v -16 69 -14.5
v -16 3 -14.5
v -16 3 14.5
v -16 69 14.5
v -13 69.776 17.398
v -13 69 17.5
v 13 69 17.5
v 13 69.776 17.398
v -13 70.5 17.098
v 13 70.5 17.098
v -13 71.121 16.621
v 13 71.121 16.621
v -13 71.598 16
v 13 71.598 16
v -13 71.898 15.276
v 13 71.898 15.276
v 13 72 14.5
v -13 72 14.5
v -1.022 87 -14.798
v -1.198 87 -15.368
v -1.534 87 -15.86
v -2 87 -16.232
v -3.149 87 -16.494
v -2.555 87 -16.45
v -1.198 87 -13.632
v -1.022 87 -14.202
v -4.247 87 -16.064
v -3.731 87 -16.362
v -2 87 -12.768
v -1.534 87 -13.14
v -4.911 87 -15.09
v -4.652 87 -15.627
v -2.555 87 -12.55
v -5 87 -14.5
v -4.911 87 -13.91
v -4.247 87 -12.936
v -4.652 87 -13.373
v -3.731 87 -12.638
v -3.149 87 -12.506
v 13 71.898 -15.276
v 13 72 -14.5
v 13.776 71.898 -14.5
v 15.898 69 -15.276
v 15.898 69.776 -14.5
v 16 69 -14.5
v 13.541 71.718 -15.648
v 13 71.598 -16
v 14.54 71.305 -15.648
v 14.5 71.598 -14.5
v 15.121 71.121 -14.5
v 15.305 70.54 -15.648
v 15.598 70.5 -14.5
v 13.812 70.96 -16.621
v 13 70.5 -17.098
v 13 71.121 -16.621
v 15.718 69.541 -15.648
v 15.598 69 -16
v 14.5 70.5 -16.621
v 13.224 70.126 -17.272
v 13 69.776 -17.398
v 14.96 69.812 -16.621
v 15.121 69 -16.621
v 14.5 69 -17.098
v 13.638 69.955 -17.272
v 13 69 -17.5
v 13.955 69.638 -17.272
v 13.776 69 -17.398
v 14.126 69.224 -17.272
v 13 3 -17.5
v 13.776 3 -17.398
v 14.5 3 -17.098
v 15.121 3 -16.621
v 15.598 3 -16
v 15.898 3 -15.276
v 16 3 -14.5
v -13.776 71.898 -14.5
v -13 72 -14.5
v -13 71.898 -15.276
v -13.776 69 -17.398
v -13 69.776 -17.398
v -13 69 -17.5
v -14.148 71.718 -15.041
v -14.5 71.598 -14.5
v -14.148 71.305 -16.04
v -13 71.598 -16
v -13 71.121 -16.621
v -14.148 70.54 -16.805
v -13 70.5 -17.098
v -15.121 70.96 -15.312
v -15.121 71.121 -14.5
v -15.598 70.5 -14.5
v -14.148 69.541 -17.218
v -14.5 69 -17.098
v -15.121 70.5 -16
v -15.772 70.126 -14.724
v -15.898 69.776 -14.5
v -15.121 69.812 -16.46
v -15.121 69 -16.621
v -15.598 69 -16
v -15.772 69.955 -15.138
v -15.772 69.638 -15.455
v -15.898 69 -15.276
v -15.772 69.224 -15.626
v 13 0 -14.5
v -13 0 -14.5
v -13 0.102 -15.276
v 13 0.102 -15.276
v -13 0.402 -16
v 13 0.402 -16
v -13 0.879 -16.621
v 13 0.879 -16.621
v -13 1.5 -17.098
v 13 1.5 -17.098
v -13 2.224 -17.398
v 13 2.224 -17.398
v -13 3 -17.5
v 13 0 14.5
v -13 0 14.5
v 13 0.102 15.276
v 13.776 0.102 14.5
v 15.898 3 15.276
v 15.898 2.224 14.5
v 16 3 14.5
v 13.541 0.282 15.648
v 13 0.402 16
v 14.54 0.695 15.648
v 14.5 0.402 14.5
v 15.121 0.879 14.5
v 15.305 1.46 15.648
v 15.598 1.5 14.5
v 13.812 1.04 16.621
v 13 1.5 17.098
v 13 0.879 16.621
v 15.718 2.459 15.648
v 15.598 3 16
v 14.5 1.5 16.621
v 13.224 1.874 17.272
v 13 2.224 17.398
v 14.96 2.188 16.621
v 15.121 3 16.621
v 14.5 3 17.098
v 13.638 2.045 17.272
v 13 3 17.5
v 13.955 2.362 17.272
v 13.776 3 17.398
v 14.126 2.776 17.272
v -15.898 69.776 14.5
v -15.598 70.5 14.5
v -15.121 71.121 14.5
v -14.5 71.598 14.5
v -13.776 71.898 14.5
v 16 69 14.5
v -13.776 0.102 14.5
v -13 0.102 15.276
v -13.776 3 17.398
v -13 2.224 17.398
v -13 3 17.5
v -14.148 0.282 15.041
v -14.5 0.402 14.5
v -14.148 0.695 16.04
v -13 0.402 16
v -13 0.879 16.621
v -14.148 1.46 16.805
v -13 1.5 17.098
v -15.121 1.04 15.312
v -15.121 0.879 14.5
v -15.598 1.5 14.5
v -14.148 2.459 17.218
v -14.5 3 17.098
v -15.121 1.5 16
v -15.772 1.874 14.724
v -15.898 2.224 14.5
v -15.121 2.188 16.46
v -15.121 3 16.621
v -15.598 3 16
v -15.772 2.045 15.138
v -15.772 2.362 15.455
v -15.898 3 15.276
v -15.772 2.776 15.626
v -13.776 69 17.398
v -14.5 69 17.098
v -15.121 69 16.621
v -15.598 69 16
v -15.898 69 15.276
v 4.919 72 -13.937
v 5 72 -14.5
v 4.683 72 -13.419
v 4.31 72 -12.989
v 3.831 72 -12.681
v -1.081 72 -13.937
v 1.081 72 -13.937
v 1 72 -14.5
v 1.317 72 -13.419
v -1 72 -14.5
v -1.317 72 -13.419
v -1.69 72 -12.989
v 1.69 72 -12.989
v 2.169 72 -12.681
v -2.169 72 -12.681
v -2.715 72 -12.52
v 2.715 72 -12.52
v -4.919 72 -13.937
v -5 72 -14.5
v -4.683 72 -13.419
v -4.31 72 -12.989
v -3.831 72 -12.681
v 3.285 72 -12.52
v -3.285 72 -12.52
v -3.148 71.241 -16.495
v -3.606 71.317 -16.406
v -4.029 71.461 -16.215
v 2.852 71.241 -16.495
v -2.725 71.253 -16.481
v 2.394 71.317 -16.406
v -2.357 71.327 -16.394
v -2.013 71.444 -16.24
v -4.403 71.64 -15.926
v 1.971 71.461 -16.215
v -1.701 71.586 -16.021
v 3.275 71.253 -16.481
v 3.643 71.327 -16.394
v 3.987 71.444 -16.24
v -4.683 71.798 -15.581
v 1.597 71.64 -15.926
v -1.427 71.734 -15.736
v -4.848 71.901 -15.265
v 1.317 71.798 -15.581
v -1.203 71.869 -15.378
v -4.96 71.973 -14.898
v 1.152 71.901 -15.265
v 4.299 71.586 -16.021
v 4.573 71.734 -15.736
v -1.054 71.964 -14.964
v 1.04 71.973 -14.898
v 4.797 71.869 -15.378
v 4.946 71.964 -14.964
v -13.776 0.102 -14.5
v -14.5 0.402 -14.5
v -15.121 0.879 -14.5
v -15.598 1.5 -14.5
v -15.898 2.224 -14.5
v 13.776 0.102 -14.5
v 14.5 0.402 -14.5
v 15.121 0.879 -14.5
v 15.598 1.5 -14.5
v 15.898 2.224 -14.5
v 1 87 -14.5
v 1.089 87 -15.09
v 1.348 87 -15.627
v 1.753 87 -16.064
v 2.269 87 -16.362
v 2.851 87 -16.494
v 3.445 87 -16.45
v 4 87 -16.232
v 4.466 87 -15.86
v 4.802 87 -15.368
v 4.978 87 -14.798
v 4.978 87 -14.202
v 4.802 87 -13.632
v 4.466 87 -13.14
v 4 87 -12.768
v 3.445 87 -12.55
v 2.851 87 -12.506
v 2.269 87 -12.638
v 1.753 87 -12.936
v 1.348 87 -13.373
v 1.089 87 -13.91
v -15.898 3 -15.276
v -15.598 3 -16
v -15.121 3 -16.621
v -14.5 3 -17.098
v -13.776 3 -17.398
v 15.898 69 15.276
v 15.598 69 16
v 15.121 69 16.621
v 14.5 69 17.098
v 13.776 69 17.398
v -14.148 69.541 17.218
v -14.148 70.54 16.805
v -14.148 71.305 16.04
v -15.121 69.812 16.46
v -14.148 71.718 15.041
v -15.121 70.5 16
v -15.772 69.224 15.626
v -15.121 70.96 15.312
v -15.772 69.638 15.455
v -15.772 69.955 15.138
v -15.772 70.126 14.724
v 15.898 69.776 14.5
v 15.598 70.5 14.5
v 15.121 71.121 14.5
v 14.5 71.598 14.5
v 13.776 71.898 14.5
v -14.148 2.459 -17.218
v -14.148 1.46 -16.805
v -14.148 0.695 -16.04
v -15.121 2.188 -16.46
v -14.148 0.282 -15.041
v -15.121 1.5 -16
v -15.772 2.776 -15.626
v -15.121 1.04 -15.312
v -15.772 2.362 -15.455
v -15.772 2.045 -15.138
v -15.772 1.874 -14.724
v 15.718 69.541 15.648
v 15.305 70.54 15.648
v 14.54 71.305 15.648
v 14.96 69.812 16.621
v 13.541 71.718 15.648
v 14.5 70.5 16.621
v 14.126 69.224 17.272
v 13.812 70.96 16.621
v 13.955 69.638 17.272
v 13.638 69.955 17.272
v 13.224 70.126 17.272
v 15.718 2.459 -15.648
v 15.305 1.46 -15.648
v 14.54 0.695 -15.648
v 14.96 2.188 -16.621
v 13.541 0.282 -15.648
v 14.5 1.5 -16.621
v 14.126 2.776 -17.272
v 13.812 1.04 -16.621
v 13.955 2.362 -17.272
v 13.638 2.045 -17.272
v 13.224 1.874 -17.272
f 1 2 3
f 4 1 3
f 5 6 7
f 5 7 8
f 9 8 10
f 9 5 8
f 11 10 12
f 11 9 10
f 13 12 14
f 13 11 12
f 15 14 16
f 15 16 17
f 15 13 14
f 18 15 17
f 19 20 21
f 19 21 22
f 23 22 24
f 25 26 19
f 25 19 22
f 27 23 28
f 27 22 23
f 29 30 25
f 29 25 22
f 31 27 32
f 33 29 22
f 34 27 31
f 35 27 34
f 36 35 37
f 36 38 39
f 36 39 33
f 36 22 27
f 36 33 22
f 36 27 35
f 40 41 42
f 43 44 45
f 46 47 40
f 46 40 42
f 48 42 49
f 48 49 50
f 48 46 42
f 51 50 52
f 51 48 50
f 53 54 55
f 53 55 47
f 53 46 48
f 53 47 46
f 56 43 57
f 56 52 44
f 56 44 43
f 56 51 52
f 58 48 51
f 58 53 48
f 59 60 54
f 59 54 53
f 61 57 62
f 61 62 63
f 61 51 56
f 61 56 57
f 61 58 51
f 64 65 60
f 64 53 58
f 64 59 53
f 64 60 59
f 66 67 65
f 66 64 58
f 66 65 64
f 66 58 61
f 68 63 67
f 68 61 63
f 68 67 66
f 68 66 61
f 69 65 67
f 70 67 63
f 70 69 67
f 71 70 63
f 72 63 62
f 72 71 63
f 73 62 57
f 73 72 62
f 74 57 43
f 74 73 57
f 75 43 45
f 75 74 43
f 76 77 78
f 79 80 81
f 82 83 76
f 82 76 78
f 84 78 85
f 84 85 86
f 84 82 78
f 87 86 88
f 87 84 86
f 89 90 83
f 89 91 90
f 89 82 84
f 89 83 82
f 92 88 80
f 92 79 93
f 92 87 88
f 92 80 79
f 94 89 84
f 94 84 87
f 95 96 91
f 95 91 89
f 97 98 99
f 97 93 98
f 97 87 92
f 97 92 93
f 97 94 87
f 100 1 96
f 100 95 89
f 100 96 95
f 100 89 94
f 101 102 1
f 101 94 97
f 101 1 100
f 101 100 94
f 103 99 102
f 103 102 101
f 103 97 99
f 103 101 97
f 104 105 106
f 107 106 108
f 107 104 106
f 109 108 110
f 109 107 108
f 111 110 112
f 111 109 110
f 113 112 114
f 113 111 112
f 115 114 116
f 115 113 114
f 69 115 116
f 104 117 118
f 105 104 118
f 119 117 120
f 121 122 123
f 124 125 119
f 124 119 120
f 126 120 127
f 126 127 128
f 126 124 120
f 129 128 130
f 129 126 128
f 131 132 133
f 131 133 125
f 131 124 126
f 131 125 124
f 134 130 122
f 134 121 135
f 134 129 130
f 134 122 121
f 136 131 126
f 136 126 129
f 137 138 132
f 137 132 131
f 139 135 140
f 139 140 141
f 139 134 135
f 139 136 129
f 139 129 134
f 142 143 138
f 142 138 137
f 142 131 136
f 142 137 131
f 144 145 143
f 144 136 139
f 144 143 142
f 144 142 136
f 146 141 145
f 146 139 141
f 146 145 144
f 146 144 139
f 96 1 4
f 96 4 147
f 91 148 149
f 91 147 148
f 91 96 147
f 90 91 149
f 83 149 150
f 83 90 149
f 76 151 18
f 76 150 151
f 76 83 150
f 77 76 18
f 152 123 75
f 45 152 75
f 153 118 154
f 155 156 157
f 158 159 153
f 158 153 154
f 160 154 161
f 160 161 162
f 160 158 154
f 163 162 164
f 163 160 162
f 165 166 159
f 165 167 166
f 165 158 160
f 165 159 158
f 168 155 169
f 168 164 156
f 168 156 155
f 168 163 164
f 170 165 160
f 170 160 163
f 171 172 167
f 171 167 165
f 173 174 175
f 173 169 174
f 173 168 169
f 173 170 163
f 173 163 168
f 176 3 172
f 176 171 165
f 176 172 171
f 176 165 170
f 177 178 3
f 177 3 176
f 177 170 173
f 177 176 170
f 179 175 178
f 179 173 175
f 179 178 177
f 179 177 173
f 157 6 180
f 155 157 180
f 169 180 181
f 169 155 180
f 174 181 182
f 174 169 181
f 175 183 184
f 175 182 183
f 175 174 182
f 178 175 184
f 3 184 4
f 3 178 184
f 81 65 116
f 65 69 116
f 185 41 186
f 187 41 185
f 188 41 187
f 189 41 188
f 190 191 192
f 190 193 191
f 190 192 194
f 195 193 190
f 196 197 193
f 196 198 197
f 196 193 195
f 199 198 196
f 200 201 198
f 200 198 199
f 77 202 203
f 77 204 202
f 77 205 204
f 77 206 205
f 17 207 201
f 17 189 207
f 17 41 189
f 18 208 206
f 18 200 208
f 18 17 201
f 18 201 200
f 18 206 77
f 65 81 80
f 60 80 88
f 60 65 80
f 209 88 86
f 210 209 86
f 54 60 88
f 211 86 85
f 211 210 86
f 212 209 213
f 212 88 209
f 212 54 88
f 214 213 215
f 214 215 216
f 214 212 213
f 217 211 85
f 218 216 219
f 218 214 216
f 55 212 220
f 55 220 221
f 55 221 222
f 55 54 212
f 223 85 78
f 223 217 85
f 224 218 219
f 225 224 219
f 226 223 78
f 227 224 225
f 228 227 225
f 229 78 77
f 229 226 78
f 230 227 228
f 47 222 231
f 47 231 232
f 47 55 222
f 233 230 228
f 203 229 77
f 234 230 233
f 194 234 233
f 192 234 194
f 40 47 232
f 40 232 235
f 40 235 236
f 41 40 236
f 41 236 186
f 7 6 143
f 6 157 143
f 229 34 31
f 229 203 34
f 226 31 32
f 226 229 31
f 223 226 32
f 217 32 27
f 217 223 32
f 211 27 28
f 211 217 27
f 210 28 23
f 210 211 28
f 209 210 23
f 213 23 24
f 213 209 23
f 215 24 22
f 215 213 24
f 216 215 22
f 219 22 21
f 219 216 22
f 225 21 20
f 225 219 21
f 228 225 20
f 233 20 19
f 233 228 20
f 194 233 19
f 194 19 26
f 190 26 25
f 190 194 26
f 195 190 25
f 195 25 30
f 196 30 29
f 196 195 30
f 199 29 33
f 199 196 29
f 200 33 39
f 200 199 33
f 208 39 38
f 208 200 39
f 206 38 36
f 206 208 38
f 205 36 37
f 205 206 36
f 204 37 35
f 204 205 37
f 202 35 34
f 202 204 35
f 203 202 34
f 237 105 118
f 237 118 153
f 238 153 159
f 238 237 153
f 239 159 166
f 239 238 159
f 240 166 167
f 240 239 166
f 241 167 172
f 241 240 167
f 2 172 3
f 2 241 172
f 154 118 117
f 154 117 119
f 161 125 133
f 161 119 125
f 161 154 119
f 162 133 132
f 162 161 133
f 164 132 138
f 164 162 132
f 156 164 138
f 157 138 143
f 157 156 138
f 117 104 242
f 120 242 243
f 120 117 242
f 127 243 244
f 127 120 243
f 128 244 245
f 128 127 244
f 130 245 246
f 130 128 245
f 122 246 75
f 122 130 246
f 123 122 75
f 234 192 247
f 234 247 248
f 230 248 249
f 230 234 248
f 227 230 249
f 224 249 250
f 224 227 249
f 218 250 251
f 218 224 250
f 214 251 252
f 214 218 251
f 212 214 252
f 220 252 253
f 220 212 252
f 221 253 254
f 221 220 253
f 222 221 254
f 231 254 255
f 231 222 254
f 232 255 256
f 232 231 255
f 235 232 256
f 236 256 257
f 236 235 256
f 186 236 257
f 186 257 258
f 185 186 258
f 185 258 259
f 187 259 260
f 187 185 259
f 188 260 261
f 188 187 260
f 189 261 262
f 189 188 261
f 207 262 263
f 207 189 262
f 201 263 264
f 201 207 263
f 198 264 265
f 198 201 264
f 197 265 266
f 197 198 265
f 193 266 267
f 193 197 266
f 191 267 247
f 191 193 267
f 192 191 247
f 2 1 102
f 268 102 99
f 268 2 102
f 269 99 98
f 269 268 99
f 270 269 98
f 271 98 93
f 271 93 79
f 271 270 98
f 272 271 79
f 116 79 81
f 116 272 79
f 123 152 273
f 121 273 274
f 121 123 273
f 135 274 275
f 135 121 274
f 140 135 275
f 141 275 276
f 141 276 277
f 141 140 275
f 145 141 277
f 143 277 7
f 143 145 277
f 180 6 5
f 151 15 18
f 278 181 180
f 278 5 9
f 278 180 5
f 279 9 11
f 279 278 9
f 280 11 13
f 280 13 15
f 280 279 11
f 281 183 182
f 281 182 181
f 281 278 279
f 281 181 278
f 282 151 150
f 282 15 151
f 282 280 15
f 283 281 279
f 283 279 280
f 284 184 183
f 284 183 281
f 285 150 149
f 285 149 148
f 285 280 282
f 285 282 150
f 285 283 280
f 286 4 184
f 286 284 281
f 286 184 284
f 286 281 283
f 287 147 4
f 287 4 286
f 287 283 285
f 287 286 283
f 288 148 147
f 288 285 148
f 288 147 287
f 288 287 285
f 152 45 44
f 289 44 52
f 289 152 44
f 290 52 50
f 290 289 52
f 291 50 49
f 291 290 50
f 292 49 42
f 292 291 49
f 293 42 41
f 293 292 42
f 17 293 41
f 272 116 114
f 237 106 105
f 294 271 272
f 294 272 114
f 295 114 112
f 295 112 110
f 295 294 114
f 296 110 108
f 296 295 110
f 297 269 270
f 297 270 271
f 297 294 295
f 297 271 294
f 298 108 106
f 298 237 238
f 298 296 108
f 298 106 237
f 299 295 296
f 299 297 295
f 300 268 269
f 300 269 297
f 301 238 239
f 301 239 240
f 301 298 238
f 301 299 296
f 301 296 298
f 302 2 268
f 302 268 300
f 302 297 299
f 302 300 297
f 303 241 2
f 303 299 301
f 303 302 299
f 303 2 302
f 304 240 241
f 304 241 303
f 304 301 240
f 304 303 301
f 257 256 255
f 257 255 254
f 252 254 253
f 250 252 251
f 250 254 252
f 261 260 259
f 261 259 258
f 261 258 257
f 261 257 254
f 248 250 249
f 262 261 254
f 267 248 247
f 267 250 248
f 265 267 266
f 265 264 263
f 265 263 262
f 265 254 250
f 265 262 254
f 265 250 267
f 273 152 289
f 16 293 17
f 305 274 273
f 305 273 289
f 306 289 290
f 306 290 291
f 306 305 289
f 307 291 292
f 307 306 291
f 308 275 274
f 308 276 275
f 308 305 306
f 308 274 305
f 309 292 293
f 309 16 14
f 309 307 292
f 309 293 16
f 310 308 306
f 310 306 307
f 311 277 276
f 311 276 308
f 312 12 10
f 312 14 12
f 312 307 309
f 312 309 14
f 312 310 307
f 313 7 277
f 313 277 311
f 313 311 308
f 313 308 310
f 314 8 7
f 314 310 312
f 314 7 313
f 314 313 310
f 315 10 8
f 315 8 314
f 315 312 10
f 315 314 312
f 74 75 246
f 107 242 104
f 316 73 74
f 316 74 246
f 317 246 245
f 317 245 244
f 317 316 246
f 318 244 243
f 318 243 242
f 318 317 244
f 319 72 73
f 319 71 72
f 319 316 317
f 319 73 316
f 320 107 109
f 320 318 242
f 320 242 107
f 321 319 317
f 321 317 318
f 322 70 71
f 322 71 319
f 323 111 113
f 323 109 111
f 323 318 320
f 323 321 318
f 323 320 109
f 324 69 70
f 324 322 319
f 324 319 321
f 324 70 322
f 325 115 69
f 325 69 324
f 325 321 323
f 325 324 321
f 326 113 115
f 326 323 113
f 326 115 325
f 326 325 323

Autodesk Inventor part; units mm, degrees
ref_plane "YZ Plane" through (0, 0, 0) normal (1, 0, 0) x (0, 1, 0)
ref_plane "XZ Plane" through (0, 0, 0) normal (0, 1, 0) x (-1, 0, 0)
ref_plane "XY Plane" through (0, 0, 0) normal (0, 0, 1) x (1, 0, 0)
sketch "Sketch1" plane through (0, 0, 0) normal (0, 1, 0) x (-1, 0, 0)
  line L0 (16, 17.5) -> (-16, 17.5)
  line L1 (-16, 17.5) -> (-16, -17.5)
  line L2 (-16, -17.5) -> (16, -17.5)
  line L3 (16, -17.5) -> (16, 17.5)
  line L4 (16, 17.5) -> (-16, -17.5) construction
  line L5 (-16, 17.5) -> (16, -17.5) construction
  line L6 (0, -17.5) -> (0, -14.5) construction
  line L7 (0, -14.5) -> (3, -14.5) construction
  circle A0 centre (3, -14.5) radius 2
  circle A1 centre (-3, -14.5) radius 2
  point P0 (0, 0)
  dimension "d0" = 32
  dimension "d1" = 35
  dimension "d5" = 3
  dimension "d6" = 3
  dimension "d7" = 4
extrude "Extrusion1" add sketch "Sketch1" along normal blind 72 contours L3 L2 L1 L0 | A0 | A1
extrude "Extrusion2" add sketch "Sketch1" along normal blind 15 from surface at 72 contours A0 | A1
fillet "Fillet1" radius 3 12 edges at (16, 36, 17.5) (16, 36, -17.5) (-16, 36, 17.5) (-16, 36, -17.5) (16, 72, 0) (0, 72, 17.5) (0, 72, -17.5) (-16, 72, 0) (16, 0, 0) (0, 0, 17.5) (-16, 0, 0) (0, 0, -17.5)
properties part number "SLS Quantum 1300mAh 4S1P 14,8V 65C"
